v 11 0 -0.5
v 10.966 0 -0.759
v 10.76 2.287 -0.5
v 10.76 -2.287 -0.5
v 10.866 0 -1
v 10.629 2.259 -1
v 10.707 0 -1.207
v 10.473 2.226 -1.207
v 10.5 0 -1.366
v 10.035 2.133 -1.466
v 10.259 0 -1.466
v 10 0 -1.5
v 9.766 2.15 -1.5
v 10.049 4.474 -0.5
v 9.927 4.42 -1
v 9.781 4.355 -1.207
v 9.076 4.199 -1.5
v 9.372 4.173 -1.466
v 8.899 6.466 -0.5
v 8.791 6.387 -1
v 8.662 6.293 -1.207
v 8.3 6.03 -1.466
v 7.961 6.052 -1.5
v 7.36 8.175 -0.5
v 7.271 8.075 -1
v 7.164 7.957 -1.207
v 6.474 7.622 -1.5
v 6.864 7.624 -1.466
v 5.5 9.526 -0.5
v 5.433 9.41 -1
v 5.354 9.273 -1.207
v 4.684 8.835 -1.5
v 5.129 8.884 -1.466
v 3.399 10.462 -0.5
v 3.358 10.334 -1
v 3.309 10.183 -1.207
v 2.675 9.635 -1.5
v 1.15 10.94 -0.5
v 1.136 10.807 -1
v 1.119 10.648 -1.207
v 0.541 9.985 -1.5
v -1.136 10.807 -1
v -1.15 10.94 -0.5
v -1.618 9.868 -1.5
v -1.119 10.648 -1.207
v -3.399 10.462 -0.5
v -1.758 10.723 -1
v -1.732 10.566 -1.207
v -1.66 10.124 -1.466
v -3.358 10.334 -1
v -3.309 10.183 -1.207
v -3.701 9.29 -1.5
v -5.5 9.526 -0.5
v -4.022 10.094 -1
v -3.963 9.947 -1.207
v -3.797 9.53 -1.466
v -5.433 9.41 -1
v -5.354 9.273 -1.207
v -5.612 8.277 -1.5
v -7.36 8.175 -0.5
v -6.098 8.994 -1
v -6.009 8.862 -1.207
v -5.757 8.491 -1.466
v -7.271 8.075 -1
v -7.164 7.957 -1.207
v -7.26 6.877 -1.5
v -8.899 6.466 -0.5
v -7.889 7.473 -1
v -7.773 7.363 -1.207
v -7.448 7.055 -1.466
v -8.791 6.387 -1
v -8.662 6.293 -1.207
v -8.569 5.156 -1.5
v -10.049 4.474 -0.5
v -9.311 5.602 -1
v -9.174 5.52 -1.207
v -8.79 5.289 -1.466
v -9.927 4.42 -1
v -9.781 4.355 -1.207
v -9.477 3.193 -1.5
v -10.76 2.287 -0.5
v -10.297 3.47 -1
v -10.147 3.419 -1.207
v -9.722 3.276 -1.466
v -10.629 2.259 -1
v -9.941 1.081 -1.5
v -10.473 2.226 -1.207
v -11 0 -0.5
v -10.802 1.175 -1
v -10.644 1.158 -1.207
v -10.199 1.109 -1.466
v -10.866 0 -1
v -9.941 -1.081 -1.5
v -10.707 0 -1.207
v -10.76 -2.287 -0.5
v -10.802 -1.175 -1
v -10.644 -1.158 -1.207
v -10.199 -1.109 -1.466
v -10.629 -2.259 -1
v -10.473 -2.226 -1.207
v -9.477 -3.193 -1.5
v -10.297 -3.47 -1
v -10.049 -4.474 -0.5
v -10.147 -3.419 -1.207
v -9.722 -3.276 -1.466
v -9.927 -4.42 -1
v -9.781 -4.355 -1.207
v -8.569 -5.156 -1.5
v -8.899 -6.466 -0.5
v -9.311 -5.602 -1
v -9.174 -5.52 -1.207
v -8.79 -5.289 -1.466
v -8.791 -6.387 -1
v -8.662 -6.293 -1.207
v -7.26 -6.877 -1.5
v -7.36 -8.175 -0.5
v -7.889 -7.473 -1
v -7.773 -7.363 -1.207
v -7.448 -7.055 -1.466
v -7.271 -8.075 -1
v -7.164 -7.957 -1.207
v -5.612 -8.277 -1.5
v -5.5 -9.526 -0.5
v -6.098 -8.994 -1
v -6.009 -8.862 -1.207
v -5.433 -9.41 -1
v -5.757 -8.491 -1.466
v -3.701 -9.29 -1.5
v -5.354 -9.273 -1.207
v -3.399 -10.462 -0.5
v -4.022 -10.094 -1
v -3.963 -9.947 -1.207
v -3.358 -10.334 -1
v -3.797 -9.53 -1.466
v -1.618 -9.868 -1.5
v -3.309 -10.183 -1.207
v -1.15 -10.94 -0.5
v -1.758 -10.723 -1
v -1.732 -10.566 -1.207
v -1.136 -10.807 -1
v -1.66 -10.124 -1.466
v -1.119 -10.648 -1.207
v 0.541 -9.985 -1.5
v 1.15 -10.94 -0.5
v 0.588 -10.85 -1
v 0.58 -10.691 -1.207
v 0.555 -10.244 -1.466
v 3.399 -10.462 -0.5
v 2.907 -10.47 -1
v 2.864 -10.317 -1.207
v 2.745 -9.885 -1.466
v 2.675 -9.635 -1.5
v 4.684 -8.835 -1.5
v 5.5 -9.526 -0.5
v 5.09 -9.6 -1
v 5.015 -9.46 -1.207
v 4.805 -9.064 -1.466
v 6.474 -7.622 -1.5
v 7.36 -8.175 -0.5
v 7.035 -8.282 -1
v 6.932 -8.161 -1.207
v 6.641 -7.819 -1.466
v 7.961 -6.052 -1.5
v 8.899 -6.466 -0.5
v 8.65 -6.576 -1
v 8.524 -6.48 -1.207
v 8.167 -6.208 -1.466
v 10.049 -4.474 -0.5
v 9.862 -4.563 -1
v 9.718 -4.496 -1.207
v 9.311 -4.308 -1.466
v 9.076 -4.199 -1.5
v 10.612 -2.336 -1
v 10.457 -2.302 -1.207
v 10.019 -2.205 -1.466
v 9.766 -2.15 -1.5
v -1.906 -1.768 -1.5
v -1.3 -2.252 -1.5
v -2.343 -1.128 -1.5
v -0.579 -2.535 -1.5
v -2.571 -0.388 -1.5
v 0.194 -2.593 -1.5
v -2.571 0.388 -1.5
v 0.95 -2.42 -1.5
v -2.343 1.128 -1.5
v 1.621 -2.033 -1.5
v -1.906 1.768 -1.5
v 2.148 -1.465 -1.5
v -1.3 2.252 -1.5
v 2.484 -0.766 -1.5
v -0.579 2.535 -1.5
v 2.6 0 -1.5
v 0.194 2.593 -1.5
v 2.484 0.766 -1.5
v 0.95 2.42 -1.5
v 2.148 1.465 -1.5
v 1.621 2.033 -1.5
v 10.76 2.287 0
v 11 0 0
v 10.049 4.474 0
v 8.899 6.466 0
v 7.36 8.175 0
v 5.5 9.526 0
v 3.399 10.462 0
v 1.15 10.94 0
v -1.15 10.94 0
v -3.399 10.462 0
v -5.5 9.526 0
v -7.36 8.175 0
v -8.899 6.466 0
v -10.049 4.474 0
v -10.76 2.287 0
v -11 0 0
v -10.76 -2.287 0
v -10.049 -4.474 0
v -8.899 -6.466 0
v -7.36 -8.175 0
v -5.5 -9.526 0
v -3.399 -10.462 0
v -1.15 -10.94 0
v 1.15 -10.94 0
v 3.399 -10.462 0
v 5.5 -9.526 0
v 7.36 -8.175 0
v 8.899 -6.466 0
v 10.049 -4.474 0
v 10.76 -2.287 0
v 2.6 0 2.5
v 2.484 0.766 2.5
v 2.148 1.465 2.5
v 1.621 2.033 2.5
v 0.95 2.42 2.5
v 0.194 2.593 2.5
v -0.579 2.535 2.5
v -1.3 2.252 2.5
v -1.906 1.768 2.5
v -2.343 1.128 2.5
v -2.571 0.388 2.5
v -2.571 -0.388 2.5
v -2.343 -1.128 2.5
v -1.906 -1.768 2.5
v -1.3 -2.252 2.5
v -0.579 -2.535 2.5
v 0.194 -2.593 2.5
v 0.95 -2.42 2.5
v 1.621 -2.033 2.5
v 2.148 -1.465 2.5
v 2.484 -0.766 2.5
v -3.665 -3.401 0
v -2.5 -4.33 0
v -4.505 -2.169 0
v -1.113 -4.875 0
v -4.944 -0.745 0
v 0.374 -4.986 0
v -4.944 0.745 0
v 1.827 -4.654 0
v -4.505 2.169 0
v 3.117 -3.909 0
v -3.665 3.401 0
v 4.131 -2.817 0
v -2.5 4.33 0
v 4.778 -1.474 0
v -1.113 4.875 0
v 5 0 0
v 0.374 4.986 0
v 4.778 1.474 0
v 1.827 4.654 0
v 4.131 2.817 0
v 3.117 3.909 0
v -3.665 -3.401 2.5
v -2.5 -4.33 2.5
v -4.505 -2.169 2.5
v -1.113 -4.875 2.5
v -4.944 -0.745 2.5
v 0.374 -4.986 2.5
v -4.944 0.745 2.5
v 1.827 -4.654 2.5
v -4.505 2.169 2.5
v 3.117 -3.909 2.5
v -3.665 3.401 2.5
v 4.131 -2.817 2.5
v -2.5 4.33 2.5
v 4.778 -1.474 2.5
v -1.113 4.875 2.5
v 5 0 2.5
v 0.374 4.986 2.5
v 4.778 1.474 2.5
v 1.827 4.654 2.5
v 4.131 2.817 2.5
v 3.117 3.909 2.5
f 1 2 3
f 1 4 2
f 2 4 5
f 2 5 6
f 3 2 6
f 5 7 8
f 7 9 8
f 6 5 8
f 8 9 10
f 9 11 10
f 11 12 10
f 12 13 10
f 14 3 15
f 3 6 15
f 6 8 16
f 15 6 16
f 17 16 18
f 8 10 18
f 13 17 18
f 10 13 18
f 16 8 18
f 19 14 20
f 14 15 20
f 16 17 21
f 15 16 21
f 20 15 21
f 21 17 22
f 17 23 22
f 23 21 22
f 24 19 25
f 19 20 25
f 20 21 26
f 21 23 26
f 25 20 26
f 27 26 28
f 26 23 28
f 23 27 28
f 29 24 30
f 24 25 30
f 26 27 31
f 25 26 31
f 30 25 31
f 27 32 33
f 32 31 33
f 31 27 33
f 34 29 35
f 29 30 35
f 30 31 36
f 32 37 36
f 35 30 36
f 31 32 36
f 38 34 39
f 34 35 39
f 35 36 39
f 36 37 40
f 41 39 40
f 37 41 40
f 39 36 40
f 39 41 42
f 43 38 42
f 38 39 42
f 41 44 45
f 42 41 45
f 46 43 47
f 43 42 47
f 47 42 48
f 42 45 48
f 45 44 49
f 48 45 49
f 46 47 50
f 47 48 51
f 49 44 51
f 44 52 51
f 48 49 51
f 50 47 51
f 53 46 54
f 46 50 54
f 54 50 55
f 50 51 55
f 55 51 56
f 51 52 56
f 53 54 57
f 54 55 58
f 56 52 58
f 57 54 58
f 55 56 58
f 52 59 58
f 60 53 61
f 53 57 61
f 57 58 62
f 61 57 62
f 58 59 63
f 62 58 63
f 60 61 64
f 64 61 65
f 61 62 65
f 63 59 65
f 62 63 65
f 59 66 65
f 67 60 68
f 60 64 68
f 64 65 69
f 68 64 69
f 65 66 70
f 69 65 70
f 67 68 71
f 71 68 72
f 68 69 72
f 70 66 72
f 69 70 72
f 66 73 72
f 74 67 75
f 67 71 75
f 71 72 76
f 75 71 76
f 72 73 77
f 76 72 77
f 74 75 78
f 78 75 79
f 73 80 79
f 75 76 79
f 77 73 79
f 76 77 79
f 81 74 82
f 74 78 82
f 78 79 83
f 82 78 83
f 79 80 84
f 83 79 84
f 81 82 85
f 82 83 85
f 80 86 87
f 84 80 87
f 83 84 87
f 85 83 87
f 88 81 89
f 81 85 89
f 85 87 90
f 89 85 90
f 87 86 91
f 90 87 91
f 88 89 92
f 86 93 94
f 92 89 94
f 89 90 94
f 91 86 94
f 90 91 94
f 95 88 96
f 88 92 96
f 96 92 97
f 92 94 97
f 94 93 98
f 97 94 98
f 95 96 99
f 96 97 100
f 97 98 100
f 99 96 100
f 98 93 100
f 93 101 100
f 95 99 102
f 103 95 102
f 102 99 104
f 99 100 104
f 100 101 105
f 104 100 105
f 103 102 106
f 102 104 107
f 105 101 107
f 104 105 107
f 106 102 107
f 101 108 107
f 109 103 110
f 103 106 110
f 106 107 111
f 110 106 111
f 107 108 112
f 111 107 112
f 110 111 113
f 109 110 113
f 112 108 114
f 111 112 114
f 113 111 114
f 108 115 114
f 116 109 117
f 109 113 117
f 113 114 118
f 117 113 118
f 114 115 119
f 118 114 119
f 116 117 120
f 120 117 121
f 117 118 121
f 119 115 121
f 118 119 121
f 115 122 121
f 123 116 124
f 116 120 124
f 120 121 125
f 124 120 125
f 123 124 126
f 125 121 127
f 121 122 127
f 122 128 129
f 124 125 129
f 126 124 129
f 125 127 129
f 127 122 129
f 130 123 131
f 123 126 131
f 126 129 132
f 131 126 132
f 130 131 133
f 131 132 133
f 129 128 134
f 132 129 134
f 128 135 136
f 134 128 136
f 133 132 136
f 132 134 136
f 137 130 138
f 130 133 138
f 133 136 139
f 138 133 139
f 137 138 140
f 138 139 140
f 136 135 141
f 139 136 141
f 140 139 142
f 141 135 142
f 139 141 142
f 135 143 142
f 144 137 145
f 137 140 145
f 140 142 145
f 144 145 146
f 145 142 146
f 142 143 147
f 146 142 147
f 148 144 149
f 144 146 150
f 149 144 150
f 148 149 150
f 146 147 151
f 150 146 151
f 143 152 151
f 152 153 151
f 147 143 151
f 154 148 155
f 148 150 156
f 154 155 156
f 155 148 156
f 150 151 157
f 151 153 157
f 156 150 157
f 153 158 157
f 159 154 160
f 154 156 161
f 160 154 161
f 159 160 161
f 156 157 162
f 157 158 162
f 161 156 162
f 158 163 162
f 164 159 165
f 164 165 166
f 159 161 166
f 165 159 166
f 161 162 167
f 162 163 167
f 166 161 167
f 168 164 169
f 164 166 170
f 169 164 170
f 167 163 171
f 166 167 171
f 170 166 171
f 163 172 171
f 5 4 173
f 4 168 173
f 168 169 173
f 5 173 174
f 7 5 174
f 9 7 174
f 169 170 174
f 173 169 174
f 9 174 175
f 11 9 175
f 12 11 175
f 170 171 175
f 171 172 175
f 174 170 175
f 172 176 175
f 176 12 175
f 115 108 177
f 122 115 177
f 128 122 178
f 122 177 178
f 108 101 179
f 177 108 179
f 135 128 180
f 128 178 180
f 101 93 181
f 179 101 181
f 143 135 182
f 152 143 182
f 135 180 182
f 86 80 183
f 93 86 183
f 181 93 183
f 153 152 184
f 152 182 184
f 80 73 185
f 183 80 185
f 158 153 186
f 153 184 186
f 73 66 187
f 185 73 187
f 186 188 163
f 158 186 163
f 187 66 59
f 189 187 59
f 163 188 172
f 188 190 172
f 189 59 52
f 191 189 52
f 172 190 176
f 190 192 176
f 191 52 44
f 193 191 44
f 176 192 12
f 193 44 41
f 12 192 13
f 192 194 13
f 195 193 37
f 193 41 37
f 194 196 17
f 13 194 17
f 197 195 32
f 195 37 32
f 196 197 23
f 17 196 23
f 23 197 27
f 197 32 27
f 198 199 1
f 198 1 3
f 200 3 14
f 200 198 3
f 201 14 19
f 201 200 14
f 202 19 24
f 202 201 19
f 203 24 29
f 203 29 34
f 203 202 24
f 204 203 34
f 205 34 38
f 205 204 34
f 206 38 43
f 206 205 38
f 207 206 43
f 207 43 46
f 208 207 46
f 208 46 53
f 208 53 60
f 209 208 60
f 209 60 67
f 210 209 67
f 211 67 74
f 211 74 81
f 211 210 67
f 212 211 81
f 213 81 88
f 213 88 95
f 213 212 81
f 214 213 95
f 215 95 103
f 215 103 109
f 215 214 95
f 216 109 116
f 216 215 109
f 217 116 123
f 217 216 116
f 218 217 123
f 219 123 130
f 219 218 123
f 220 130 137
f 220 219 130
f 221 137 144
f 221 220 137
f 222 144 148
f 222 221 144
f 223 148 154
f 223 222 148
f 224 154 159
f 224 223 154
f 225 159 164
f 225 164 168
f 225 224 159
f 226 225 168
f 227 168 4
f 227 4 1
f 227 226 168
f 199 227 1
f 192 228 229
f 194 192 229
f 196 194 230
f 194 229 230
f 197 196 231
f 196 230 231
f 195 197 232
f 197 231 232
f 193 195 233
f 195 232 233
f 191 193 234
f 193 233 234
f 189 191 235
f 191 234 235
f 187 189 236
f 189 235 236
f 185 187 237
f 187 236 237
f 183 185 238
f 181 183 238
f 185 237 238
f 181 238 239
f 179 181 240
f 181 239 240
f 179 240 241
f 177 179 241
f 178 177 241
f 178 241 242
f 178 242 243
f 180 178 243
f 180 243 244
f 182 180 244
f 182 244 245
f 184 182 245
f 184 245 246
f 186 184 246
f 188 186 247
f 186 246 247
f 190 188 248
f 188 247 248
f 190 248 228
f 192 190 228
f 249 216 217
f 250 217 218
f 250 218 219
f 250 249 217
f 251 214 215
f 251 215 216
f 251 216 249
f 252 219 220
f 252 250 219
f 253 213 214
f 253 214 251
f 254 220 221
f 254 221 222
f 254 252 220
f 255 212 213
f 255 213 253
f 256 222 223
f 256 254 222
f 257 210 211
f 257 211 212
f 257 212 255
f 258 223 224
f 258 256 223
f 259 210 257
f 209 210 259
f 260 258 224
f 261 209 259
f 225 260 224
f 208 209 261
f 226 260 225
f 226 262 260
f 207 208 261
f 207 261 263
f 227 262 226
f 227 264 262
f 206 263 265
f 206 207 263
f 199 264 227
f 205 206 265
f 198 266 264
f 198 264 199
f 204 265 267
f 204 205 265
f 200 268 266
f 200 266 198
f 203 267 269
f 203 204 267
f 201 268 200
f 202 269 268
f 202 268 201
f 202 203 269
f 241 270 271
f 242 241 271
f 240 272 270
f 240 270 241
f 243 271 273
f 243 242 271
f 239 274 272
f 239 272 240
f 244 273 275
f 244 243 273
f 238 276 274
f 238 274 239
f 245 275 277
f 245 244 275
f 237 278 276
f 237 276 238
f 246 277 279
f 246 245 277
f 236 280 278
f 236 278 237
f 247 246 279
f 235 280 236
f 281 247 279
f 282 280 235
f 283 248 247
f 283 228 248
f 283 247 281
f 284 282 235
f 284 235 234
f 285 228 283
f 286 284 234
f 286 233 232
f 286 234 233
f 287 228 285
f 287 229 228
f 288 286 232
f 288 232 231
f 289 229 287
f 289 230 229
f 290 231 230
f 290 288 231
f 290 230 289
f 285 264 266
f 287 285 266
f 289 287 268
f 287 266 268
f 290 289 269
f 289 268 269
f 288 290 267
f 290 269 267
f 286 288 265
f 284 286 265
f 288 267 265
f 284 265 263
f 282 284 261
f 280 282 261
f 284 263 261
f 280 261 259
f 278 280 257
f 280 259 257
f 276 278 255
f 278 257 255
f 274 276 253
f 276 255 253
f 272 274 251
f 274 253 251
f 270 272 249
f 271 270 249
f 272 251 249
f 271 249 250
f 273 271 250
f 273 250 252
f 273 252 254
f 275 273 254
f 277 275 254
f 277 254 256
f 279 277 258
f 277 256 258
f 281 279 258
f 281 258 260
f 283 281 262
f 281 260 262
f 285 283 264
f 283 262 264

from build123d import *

# Parameters (mm, degrees)
F0_R     = 11
F1_DEPTH = 1.5
F2_R     = 5
F3_DEPTH = 2.5
F4_R     = 2.6
F5_DEPTH = 4
F6_R     = 1


with BuildPart() as f1:
    # F0 (on Top) → F1 (new body)
    with BuildSketch(Plane.XY):
        Circle(F0_R)
    extrude(amount=-F1_DEPTH)

    # F2 (on face) → F3 (join)
    with BuildSketch(Plane.XY):
        Circle(F2_R)
    extrude(amount=F3_DEPTH)

    # F4 (on face) → F5 (cut)
    with BuildSketch(Plane.XY.offset(2.5)):
        Circle(F4_R)
    extrude(amount=-F5_DEPTH, mode=Mode.SUBTRACT)

    # F6
    f6_edges = [f1.edges().sort_by_distance(p)[0] for p in [
        (-11, 0, -1.5),
    ]]
    fillet(f6_edges, radius=F6_R)


solid = f1.part
